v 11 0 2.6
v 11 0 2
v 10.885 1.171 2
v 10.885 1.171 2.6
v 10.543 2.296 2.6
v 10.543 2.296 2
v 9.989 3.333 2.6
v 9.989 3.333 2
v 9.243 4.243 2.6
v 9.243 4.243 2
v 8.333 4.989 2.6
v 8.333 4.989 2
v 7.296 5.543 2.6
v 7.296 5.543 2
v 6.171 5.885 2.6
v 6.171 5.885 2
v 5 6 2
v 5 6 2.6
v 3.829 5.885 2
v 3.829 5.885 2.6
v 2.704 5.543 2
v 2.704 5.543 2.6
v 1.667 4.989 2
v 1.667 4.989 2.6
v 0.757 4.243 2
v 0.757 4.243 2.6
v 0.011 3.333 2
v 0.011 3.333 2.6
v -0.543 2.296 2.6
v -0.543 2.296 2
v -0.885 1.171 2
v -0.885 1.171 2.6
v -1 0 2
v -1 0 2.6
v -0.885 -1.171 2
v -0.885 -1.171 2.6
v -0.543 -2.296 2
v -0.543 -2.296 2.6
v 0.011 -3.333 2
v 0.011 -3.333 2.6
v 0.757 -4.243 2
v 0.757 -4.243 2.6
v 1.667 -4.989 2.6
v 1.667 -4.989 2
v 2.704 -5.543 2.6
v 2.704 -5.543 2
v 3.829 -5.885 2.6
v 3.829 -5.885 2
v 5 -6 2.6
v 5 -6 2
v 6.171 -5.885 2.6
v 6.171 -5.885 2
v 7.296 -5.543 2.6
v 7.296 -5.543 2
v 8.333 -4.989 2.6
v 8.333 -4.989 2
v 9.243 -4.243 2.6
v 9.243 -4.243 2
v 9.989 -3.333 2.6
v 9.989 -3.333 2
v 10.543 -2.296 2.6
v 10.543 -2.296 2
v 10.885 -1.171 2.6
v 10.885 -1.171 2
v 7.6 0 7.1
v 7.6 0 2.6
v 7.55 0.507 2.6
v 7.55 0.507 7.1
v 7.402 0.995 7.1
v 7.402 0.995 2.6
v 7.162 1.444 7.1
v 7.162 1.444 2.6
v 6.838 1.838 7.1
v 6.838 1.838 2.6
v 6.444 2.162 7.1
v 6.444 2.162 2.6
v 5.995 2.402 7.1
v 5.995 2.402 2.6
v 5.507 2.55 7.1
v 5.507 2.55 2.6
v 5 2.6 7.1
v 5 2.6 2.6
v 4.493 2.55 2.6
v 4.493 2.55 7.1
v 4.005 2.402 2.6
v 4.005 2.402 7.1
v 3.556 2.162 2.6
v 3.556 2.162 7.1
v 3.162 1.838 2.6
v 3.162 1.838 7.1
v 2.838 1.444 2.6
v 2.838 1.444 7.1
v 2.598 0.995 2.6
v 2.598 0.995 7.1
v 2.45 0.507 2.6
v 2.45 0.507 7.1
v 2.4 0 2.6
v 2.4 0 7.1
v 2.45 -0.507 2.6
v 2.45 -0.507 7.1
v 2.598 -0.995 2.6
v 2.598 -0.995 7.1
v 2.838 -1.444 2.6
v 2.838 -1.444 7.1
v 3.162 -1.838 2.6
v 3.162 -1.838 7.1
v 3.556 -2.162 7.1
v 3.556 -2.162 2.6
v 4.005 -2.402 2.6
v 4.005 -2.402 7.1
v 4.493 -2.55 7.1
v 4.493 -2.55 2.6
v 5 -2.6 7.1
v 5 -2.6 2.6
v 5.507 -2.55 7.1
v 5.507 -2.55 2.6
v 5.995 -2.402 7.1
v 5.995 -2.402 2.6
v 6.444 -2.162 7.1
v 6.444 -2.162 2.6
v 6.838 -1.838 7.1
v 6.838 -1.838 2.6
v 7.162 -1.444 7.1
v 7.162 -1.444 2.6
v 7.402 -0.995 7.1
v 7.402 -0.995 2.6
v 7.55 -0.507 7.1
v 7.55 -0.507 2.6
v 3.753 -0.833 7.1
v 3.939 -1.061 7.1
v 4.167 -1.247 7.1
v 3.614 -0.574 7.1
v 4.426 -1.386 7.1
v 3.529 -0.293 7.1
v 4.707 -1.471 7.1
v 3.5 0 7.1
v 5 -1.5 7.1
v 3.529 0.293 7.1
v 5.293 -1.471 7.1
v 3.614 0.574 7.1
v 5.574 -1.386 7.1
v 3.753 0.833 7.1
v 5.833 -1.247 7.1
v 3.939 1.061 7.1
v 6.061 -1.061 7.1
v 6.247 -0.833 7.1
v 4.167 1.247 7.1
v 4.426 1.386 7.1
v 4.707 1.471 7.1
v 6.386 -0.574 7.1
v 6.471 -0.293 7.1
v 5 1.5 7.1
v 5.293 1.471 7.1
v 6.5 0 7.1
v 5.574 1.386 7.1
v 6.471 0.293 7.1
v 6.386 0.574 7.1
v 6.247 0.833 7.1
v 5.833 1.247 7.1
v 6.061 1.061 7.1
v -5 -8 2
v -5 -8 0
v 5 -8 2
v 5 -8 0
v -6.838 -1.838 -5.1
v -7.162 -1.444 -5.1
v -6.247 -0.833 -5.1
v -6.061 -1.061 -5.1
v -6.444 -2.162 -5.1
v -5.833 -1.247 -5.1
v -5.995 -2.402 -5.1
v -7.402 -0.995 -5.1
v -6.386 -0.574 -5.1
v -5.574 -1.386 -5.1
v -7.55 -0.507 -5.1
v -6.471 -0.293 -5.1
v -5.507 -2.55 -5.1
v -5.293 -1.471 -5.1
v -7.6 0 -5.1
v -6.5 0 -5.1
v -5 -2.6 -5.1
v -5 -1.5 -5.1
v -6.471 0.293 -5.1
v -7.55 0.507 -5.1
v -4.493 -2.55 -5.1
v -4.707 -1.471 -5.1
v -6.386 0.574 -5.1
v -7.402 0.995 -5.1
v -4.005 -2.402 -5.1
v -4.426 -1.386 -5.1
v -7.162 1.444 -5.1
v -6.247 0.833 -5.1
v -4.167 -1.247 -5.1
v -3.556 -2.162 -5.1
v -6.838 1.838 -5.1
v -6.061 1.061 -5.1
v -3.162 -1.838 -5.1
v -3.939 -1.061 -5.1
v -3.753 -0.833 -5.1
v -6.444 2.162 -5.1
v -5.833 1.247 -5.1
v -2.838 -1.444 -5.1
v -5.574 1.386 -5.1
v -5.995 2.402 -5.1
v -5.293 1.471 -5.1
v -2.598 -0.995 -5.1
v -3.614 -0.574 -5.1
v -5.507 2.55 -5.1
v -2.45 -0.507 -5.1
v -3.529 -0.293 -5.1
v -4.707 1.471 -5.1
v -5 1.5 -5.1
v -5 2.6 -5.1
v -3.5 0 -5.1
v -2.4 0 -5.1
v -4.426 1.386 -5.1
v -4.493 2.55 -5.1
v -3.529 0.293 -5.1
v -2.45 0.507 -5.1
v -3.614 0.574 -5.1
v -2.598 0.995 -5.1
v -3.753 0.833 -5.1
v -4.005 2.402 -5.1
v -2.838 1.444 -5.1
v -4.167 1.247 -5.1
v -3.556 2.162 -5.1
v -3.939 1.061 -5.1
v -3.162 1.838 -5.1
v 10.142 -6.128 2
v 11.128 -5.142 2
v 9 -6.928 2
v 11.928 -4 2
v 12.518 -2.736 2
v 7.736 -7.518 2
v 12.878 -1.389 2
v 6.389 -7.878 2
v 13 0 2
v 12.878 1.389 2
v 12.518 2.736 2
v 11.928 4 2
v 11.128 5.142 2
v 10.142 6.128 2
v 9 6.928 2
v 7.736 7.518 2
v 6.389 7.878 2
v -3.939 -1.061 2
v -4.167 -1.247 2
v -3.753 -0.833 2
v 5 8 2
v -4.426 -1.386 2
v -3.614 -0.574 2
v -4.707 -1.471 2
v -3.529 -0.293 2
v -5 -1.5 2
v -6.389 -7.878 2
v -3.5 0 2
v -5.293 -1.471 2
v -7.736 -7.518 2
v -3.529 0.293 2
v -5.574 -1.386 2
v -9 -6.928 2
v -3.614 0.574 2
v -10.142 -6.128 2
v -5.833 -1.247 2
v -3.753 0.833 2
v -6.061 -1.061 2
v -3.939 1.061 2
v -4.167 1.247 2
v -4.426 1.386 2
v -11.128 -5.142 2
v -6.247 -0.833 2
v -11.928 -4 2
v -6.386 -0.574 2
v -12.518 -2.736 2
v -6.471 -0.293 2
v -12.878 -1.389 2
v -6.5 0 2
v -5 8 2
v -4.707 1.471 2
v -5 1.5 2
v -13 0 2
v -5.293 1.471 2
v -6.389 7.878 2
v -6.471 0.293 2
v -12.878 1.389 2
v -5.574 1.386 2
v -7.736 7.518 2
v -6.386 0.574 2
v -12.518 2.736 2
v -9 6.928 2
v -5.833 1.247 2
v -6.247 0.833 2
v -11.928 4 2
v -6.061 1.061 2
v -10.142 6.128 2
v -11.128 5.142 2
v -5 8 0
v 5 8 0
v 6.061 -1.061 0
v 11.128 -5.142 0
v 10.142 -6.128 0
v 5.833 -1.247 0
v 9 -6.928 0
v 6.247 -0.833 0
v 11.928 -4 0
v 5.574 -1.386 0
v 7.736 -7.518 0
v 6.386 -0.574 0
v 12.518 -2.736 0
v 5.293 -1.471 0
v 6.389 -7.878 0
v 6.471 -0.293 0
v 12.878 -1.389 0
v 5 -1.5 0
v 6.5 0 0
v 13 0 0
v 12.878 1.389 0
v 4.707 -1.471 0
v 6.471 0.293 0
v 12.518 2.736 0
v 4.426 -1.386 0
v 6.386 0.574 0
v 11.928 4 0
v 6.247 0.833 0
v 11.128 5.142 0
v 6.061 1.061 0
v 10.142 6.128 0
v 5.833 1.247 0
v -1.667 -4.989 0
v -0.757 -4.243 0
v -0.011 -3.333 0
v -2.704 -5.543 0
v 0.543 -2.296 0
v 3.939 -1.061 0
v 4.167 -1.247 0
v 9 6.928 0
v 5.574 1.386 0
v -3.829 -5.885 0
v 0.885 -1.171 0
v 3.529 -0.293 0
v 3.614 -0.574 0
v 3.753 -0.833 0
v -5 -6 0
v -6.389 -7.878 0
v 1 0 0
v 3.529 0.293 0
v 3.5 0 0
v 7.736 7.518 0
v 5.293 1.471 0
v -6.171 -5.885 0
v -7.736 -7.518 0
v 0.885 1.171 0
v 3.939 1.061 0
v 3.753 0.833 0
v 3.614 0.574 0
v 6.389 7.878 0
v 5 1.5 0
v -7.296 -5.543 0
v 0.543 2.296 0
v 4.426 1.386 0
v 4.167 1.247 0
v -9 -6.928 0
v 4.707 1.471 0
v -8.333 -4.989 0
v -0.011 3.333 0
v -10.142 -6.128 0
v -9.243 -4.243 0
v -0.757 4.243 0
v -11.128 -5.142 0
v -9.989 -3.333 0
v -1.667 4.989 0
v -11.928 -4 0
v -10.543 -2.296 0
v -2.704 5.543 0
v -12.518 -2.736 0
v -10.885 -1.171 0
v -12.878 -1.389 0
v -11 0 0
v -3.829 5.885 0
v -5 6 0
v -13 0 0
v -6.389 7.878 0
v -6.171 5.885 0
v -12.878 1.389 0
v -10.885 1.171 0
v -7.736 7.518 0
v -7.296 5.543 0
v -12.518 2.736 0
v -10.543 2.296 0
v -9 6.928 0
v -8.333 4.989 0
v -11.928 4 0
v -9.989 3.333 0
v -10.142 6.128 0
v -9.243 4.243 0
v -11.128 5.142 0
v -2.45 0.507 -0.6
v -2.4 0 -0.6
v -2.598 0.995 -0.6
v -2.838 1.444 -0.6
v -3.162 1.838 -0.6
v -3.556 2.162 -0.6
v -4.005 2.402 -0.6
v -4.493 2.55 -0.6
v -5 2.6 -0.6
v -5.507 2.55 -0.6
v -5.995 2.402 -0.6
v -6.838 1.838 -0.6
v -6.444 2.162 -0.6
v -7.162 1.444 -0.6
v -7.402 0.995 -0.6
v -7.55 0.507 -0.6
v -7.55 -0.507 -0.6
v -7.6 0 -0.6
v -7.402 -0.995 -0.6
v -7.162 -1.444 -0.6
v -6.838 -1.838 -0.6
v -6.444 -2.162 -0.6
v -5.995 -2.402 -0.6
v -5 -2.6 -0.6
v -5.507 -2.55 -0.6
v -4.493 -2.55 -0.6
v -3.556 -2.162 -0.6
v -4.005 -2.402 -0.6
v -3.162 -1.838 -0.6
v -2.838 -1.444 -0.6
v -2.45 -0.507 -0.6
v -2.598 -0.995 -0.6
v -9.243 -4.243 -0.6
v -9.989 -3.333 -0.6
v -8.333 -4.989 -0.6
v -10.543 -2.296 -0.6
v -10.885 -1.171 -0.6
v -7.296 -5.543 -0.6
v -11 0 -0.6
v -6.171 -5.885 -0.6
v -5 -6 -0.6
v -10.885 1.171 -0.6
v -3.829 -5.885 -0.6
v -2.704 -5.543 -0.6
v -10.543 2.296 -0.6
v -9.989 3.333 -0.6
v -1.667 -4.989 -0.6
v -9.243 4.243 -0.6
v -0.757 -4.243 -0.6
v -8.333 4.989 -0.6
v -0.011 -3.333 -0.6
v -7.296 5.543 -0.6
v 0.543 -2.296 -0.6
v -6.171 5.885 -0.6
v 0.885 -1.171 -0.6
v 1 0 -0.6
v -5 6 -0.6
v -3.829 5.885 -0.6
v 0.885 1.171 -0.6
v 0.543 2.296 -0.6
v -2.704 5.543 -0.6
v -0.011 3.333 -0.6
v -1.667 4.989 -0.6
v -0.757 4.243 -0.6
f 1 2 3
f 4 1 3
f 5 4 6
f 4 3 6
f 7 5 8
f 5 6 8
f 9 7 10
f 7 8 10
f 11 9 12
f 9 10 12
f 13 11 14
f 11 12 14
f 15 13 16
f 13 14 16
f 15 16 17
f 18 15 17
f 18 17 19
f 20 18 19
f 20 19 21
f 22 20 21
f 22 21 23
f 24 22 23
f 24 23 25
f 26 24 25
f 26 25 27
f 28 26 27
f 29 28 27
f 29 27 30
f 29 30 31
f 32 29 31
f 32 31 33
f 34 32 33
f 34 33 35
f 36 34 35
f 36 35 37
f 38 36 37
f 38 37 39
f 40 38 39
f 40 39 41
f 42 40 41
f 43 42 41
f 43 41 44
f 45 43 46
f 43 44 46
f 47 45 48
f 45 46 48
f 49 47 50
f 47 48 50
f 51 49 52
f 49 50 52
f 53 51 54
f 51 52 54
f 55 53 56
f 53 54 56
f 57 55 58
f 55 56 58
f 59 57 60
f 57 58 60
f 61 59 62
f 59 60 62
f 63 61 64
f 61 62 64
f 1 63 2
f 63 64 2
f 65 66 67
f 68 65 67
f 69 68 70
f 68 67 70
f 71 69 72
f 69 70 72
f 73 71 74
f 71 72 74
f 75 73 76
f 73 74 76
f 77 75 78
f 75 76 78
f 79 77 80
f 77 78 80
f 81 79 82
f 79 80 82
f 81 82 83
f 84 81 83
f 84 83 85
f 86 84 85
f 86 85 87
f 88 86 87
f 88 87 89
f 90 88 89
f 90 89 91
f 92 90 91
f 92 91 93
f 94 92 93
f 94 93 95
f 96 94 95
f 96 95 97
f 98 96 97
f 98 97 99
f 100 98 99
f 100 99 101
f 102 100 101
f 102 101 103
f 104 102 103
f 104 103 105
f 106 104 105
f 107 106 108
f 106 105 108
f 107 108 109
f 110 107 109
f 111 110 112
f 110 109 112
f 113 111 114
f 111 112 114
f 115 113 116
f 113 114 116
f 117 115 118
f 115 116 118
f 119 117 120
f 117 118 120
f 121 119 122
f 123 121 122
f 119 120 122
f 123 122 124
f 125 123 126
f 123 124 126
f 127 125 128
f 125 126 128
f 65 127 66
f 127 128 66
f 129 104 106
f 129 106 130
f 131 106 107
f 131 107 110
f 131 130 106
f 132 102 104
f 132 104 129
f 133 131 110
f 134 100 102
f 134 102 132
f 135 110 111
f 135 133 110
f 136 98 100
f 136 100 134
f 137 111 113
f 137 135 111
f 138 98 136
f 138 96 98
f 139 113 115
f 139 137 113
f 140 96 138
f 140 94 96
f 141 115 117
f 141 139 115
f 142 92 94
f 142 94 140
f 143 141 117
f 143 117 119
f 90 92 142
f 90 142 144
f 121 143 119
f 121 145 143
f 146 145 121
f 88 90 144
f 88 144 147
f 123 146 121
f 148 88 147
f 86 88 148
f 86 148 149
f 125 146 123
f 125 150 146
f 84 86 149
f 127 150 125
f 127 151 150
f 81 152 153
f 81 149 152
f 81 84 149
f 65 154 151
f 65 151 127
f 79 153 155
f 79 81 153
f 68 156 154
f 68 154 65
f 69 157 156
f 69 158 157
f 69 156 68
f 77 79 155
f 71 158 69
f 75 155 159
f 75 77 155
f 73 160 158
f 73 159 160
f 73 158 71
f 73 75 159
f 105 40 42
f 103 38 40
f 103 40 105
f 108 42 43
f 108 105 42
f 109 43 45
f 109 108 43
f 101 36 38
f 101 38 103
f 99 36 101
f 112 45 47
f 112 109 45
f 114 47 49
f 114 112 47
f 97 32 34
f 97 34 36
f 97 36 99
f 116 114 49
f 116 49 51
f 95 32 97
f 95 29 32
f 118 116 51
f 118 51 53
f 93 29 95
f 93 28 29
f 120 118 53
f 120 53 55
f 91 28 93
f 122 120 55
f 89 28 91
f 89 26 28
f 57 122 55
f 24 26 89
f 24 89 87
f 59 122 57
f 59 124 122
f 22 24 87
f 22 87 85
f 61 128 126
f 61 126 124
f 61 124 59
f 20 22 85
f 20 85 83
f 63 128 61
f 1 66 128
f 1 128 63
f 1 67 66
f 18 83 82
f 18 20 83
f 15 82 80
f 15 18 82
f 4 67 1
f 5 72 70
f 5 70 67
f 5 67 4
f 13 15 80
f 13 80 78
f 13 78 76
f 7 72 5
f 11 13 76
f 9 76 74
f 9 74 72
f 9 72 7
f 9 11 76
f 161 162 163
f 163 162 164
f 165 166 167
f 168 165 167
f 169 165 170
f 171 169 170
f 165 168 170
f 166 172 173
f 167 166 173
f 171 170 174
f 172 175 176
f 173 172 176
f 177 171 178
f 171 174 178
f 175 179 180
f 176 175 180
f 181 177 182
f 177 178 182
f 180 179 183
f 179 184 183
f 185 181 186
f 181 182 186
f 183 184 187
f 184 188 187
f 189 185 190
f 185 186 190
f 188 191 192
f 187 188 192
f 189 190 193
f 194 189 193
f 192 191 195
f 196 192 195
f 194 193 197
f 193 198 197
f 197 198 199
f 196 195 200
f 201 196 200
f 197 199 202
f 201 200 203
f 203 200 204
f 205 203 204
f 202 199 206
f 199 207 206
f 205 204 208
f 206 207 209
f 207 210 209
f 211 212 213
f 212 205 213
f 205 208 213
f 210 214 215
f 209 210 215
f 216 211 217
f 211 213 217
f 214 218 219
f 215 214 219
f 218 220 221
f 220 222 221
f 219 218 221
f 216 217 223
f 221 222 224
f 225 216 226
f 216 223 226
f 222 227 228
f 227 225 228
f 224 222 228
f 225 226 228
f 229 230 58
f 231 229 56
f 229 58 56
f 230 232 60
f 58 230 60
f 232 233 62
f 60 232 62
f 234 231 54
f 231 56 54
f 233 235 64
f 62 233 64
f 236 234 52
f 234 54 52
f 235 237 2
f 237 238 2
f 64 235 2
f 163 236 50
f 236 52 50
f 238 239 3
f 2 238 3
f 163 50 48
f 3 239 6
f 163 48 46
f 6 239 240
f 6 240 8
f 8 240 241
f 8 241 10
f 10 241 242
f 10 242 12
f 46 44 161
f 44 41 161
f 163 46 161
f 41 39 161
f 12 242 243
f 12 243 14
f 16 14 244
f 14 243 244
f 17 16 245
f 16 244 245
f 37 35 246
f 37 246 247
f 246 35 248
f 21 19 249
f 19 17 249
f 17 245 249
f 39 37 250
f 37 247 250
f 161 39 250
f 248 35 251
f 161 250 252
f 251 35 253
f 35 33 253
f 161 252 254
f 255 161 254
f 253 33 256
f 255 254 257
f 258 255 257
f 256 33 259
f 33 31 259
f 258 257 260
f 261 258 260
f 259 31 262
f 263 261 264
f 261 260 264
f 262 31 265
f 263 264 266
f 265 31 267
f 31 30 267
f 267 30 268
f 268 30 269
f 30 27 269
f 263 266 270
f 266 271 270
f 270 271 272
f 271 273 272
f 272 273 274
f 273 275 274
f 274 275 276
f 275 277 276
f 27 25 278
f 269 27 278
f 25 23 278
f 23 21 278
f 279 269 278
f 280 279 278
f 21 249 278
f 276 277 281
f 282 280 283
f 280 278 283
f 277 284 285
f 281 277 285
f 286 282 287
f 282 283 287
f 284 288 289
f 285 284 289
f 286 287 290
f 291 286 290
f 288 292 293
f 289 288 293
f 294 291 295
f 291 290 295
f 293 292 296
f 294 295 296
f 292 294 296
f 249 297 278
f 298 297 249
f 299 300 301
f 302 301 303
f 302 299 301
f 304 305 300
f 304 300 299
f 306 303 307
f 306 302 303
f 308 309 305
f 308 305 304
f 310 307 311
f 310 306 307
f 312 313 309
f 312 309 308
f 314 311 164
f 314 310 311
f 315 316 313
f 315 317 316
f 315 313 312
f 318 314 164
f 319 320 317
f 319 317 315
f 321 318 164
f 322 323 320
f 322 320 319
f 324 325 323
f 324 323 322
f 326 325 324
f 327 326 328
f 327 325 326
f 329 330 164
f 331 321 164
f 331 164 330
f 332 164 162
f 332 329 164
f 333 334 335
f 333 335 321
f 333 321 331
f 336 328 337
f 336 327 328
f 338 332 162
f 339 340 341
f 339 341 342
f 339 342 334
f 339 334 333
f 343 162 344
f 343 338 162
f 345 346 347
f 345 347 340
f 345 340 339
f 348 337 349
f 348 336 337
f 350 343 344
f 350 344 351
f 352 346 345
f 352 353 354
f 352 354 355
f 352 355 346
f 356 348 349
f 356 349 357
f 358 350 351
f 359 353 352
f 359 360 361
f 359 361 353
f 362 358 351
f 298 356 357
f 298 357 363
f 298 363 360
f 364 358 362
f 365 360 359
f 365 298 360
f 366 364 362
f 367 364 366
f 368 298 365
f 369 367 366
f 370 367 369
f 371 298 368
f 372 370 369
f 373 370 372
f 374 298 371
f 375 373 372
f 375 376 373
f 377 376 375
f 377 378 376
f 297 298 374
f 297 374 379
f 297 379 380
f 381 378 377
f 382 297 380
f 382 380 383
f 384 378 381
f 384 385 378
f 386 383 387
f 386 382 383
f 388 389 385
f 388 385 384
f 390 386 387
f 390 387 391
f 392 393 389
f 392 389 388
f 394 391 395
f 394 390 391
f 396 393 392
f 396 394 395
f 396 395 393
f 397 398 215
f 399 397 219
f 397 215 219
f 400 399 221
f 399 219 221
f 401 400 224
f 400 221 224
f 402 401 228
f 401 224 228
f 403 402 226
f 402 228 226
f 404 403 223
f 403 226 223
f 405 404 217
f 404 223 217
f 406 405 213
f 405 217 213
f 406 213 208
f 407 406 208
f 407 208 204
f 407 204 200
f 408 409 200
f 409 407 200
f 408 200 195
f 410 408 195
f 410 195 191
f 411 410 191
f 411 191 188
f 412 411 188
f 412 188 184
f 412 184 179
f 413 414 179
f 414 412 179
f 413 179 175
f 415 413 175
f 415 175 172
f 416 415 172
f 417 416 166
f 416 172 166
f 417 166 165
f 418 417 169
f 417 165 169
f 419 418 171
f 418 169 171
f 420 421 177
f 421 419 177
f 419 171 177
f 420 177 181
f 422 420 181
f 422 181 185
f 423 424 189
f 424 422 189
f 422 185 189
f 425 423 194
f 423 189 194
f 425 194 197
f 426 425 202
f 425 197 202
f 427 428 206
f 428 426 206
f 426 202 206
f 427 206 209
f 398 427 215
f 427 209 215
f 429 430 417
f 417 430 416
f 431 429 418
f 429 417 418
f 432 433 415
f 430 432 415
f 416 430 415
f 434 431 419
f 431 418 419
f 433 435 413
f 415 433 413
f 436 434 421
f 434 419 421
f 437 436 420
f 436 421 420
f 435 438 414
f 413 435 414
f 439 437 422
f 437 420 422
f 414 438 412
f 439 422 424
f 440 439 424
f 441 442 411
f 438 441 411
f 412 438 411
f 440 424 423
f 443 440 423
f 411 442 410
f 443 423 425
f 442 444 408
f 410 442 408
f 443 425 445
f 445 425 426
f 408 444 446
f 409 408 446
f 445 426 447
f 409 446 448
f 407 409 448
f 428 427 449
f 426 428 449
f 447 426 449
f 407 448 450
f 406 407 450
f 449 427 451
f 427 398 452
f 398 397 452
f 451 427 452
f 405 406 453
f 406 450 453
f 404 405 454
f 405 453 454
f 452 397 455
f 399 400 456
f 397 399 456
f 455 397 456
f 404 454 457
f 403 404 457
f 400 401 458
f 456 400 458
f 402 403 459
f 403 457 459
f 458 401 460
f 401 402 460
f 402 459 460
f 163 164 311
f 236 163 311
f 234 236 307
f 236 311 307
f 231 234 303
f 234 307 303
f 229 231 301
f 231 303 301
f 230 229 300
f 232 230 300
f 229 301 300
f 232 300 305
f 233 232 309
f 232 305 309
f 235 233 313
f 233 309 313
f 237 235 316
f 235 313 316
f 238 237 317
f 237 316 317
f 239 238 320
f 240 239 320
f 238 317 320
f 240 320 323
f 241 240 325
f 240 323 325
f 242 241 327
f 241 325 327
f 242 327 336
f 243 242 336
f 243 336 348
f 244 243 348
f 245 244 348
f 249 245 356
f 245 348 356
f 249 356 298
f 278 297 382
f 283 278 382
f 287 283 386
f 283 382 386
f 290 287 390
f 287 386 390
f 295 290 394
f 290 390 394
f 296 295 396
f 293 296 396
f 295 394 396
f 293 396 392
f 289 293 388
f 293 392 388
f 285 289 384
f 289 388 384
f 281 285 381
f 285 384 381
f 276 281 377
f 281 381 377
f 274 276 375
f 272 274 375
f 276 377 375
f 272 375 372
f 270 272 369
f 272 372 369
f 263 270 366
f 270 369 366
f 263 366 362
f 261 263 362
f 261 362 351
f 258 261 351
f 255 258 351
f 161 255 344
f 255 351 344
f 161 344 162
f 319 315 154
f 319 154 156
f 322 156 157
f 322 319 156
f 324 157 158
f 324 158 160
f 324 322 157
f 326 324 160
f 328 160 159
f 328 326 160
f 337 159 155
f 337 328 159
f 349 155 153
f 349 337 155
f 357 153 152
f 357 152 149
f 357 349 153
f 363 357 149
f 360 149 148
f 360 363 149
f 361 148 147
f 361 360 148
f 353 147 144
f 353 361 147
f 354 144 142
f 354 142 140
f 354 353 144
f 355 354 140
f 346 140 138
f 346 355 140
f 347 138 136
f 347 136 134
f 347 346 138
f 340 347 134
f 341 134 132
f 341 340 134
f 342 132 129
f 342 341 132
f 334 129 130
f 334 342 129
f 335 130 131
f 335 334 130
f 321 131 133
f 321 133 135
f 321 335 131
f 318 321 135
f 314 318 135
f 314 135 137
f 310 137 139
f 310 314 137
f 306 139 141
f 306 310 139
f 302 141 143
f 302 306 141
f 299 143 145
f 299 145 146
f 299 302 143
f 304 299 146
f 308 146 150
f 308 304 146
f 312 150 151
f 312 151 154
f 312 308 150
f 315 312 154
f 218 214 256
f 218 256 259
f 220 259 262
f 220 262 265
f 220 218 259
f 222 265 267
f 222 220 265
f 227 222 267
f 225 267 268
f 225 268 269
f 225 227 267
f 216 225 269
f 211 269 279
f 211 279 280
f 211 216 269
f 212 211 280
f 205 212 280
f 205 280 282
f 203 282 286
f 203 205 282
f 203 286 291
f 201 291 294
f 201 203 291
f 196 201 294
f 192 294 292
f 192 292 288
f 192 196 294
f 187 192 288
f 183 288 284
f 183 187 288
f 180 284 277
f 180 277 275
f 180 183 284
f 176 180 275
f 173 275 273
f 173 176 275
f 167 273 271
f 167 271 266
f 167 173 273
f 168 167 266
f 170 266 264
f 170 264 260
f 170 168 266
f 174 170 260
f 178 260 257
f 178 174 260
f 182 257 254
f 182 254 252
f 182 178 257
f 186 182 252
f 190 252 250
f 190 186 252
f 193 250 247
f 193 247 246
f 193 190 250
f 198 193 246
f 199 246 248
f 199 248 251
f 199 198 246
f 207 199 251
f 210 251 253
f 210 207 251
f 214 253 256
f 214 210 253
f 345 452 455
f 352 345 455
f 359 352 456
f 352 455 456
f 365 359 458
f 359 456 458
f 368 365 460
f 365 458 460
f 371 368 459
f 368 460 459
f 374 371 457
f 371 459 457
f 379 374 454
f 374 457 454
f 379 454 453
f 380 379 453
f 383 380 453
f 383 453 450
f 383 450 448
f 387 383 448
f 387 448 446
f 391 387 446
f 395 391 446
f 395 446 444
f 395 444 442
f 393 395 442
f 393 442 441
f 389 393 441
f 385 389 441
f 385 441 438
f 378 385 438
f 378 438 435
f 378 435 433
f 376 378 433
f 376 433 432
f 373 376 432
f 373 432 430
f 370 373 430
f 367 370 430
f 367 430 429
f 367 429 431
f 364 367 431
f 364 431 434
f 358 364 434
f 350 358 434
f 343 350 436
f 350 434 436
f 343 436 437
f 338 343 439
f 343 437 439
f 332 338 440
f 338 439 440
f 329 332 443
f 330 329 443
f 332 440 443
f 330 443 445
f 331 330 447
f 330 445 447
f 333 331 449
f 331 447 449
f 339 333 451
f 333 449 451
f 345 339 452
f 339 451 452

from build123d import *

# Parameters (mm, degrees)
CYLINDER009_R     = 1.5
CYLINDER009_DEPTH = 7.1
CYLINDER007_R     = 1.5
CYLINDER007_DEPTH = 7.1
CYLINDER006_R     = 6
CYLINDER006_DEPTH = 2.6
CYLINDER008_R     = 2.6
CYLINDER008_DEPTH = 7.1
CYLINDER010_R     = 2.6
CYLINDER010_DEPTH = 7.1
PAD_DEPTH         = 2
CYLINDER005_R     = 6
CYLINDER005_DEPTH = 2.6


with BuildPart() as cylinder009:
    # Cylinder009 → Cylinder009 (new body)
    with BuildSketch(Plane(origin=(-5, 0, -5.1), x_dir=(1, 0, 0), z_dir=(0, 0, 1))):
        Circle(CYLINDER009_R)
    extrude(amount=CYLINDER009_DEPTH)


with BuildPart() as idle_linkage_hole_fusion:
    # Cylinder007 → Cylinder007 (new body)
    with BuildSketch(Plane(origin=(5, 0, 0), x_dir=(1, 0, 0), z_dir=(0, 0, 1))):
        Circle(CYLINDER007_R)
    extrude(amount=CYLINDER007_DEPTH)

    # Fusion009: union Cylinder009
    add(cylinder009.part)


with BuildPart() as cylinder006:
    # Cylinder006 → Cylinder006 (new body)
    with BuildSketch(Plane(origin=(-5, 0, -0.6), x_dir=(1, 0, 0), z_dir=(0, 0, 1))):
        Circle(CYLINDER006_R)
    extrude(amount=CYLINDER006_DEPTH)


with BuildPart() as cylinder008:
    # Cylinder008 → Cylinder008 (new body)
    with BuildSketch(Plane(origin=(5, 0, 0), x_dir=(1, 0, 0), z_dir=(0, 0, 1))):
        Circle(CYLINDER008_R)
    extrude(amount=CYLINDER008_DEPTH)


with BuildPart() as cylinder010:
    # Cylinder010 → Cylinder010 (new body)
    with BuildSketch(Plane(origin=(-5, 0, -5.1), x_dir=(1, 0, 0), z_dir=(0, 0, 1))):
        Circle(CYLINDER010_R)
    extrude(amount=CYLINDER010_DEPTH)


with BuildPart() as idle_linkage_base_body:
    # Sketch008 → Pad (new body)
    with BuildSketch(Plane.XY):
        with BuildLine():
            Line((-5, 8), (5, 8))
            ThreePointArc((5, -8), (13, 0), (5, 8))
            Line((-5, -8), (5, -8))
            ThreePointArc((-5, 8), (-13, 0), (-5, -8))
        make_face()
    extrude(amount=PAD_DEPTH)


with BuildPart() as idle_fusion_cut:
    # Cylinder005 → Cylinder005 (new body)
    with BuildSketch(Plane(origin=(5, 0, 0), x_dir=(1, 0, 0), z_dir=(0, 0, 1))):
        Circle(CYLINDER005_R)
    extrude(amount=CYLINDER005_DEPTH)

    # Fusion008: union Cylinder006, Cylinder008, Cylinder010, idle linkage base body
    add(cylinder006.part)
    add(cylinder008.part)
    add(cylinder010.part)
    add(idle_linkage_base_body.part)

    # Cut001: cut idle linkage hole fusion
    add(idle_linkage_hole_fusion.part, mode=Mode.SUBTRACT)


solid = idle_fusion_cut.part
